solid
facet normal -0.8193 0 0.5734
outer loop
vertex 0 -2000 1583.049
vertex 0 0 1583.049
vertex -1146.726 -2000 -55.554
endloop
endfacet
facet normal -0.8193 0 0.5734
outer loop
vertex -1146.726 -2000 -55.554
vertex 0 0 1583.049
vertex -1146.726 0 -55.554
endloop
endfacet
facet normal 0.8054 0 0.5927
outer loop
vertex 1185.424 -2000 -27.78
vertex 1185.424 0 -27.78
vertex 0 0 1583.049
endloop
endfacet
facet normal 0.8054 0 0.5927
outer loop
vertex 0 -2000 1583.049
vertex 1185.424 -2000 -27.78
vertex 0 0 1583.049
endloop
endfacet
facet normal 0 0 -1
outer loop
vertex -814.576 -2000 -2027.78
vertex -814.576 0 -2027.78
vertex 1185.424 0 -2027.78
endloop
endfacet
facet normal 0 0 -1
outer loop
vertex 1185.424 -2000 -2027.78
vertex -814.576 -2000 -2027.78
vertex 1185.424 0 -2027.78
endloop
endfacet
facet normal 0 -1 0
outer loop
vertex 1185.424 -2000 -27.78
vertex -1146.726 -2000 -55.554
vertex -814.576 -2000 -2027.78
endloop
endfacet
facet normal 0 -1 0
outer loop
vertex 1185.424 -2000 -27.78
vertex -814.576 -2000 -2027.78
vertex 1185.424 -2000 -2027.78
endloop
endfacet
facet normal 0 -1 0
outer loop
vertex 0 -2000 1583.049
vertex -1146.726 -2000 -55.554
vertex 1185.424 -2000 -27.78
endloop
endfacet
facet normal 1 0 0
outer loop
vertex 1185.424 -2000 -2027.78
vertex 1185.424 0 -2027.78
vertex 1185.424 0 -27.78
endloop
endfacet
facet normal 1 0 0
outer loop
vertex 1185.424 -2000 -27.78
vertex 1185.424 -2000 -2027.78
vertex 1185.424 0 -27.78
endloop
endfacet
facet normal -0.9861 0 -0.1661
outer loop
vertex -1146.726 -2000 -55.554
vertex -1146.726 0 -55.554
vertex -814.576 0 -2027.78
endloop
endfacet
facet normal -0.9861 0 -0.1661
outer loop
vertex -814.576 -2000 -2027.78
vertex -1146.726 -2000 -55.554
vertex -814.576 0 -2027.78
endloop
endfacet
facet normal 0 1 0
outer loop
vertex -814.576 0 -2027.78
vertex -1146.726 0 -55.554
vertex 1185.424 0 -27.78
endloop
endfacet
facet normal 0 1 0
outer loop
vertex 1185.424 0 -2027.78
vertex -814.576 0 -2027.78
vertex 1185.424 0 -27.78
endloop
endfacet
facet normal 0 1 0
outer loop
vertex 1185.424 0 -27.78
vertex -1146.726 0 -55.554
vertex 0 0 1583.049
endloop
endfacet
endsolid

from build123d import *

# Parameters (mm, degrees)
F0_W     = 30.3246276453
F0_H     = 62.882467173
F1_DEPTH = 2000
F3_DEPTH = 39.7
F5_DEPTH = 25


with BuildPart() as f1:
    # F0 (on Front) → F1 (new body)
    with BuildSketch(Plane.XZ):
        Polygon((15.5736943707, -2027.7801752798), (1185.4242439872, -2027.7801752798), (1185.4242439872, -27.7801752798), (0, 1583.0486057418), (-1146.7263825591, -55.5540317341), (-814.5757560128, -2027.7801752798), (-14.7509332746, -2027.7801752798), (-14.7509332746, -1964.8977081067), (15.5736943707, -1964.8977081067), align=None)
        with Locations((0.411380548, -1996.3389416932)):
            Rectangle(F0_W, F0_H)
    extrude(amount=F1_DEPTH)

    # F2 (on face) → F3 (cut)
    with BuildSketch(Plane.XZ.offset(2000)):
        Polygon((-1157.9087838261, -65.6622456058), (-1146.7263825591, -55.5540317341), (-1157.9087838261, -55.5540317341), align=None)
    extrude(amount=-F3_DEPTH, mode=Mode.SUBTRACT)

    # F4 (on face) → F5 (cut)
    with BuildSketch(Plane(origin=(0, 0, 0), x_dir=(-1, 0, 0), z_dir=(0, 1, 0))):
        Polygon((-11.182401267, 1572.3321935253), (0, 1583.0486057418), (-11.182401267, 1583.0486057418), align=None)
    extrude(amount=-F5_DEPTH, mode=Mode.SUBTRACT)


solid = f1.part
